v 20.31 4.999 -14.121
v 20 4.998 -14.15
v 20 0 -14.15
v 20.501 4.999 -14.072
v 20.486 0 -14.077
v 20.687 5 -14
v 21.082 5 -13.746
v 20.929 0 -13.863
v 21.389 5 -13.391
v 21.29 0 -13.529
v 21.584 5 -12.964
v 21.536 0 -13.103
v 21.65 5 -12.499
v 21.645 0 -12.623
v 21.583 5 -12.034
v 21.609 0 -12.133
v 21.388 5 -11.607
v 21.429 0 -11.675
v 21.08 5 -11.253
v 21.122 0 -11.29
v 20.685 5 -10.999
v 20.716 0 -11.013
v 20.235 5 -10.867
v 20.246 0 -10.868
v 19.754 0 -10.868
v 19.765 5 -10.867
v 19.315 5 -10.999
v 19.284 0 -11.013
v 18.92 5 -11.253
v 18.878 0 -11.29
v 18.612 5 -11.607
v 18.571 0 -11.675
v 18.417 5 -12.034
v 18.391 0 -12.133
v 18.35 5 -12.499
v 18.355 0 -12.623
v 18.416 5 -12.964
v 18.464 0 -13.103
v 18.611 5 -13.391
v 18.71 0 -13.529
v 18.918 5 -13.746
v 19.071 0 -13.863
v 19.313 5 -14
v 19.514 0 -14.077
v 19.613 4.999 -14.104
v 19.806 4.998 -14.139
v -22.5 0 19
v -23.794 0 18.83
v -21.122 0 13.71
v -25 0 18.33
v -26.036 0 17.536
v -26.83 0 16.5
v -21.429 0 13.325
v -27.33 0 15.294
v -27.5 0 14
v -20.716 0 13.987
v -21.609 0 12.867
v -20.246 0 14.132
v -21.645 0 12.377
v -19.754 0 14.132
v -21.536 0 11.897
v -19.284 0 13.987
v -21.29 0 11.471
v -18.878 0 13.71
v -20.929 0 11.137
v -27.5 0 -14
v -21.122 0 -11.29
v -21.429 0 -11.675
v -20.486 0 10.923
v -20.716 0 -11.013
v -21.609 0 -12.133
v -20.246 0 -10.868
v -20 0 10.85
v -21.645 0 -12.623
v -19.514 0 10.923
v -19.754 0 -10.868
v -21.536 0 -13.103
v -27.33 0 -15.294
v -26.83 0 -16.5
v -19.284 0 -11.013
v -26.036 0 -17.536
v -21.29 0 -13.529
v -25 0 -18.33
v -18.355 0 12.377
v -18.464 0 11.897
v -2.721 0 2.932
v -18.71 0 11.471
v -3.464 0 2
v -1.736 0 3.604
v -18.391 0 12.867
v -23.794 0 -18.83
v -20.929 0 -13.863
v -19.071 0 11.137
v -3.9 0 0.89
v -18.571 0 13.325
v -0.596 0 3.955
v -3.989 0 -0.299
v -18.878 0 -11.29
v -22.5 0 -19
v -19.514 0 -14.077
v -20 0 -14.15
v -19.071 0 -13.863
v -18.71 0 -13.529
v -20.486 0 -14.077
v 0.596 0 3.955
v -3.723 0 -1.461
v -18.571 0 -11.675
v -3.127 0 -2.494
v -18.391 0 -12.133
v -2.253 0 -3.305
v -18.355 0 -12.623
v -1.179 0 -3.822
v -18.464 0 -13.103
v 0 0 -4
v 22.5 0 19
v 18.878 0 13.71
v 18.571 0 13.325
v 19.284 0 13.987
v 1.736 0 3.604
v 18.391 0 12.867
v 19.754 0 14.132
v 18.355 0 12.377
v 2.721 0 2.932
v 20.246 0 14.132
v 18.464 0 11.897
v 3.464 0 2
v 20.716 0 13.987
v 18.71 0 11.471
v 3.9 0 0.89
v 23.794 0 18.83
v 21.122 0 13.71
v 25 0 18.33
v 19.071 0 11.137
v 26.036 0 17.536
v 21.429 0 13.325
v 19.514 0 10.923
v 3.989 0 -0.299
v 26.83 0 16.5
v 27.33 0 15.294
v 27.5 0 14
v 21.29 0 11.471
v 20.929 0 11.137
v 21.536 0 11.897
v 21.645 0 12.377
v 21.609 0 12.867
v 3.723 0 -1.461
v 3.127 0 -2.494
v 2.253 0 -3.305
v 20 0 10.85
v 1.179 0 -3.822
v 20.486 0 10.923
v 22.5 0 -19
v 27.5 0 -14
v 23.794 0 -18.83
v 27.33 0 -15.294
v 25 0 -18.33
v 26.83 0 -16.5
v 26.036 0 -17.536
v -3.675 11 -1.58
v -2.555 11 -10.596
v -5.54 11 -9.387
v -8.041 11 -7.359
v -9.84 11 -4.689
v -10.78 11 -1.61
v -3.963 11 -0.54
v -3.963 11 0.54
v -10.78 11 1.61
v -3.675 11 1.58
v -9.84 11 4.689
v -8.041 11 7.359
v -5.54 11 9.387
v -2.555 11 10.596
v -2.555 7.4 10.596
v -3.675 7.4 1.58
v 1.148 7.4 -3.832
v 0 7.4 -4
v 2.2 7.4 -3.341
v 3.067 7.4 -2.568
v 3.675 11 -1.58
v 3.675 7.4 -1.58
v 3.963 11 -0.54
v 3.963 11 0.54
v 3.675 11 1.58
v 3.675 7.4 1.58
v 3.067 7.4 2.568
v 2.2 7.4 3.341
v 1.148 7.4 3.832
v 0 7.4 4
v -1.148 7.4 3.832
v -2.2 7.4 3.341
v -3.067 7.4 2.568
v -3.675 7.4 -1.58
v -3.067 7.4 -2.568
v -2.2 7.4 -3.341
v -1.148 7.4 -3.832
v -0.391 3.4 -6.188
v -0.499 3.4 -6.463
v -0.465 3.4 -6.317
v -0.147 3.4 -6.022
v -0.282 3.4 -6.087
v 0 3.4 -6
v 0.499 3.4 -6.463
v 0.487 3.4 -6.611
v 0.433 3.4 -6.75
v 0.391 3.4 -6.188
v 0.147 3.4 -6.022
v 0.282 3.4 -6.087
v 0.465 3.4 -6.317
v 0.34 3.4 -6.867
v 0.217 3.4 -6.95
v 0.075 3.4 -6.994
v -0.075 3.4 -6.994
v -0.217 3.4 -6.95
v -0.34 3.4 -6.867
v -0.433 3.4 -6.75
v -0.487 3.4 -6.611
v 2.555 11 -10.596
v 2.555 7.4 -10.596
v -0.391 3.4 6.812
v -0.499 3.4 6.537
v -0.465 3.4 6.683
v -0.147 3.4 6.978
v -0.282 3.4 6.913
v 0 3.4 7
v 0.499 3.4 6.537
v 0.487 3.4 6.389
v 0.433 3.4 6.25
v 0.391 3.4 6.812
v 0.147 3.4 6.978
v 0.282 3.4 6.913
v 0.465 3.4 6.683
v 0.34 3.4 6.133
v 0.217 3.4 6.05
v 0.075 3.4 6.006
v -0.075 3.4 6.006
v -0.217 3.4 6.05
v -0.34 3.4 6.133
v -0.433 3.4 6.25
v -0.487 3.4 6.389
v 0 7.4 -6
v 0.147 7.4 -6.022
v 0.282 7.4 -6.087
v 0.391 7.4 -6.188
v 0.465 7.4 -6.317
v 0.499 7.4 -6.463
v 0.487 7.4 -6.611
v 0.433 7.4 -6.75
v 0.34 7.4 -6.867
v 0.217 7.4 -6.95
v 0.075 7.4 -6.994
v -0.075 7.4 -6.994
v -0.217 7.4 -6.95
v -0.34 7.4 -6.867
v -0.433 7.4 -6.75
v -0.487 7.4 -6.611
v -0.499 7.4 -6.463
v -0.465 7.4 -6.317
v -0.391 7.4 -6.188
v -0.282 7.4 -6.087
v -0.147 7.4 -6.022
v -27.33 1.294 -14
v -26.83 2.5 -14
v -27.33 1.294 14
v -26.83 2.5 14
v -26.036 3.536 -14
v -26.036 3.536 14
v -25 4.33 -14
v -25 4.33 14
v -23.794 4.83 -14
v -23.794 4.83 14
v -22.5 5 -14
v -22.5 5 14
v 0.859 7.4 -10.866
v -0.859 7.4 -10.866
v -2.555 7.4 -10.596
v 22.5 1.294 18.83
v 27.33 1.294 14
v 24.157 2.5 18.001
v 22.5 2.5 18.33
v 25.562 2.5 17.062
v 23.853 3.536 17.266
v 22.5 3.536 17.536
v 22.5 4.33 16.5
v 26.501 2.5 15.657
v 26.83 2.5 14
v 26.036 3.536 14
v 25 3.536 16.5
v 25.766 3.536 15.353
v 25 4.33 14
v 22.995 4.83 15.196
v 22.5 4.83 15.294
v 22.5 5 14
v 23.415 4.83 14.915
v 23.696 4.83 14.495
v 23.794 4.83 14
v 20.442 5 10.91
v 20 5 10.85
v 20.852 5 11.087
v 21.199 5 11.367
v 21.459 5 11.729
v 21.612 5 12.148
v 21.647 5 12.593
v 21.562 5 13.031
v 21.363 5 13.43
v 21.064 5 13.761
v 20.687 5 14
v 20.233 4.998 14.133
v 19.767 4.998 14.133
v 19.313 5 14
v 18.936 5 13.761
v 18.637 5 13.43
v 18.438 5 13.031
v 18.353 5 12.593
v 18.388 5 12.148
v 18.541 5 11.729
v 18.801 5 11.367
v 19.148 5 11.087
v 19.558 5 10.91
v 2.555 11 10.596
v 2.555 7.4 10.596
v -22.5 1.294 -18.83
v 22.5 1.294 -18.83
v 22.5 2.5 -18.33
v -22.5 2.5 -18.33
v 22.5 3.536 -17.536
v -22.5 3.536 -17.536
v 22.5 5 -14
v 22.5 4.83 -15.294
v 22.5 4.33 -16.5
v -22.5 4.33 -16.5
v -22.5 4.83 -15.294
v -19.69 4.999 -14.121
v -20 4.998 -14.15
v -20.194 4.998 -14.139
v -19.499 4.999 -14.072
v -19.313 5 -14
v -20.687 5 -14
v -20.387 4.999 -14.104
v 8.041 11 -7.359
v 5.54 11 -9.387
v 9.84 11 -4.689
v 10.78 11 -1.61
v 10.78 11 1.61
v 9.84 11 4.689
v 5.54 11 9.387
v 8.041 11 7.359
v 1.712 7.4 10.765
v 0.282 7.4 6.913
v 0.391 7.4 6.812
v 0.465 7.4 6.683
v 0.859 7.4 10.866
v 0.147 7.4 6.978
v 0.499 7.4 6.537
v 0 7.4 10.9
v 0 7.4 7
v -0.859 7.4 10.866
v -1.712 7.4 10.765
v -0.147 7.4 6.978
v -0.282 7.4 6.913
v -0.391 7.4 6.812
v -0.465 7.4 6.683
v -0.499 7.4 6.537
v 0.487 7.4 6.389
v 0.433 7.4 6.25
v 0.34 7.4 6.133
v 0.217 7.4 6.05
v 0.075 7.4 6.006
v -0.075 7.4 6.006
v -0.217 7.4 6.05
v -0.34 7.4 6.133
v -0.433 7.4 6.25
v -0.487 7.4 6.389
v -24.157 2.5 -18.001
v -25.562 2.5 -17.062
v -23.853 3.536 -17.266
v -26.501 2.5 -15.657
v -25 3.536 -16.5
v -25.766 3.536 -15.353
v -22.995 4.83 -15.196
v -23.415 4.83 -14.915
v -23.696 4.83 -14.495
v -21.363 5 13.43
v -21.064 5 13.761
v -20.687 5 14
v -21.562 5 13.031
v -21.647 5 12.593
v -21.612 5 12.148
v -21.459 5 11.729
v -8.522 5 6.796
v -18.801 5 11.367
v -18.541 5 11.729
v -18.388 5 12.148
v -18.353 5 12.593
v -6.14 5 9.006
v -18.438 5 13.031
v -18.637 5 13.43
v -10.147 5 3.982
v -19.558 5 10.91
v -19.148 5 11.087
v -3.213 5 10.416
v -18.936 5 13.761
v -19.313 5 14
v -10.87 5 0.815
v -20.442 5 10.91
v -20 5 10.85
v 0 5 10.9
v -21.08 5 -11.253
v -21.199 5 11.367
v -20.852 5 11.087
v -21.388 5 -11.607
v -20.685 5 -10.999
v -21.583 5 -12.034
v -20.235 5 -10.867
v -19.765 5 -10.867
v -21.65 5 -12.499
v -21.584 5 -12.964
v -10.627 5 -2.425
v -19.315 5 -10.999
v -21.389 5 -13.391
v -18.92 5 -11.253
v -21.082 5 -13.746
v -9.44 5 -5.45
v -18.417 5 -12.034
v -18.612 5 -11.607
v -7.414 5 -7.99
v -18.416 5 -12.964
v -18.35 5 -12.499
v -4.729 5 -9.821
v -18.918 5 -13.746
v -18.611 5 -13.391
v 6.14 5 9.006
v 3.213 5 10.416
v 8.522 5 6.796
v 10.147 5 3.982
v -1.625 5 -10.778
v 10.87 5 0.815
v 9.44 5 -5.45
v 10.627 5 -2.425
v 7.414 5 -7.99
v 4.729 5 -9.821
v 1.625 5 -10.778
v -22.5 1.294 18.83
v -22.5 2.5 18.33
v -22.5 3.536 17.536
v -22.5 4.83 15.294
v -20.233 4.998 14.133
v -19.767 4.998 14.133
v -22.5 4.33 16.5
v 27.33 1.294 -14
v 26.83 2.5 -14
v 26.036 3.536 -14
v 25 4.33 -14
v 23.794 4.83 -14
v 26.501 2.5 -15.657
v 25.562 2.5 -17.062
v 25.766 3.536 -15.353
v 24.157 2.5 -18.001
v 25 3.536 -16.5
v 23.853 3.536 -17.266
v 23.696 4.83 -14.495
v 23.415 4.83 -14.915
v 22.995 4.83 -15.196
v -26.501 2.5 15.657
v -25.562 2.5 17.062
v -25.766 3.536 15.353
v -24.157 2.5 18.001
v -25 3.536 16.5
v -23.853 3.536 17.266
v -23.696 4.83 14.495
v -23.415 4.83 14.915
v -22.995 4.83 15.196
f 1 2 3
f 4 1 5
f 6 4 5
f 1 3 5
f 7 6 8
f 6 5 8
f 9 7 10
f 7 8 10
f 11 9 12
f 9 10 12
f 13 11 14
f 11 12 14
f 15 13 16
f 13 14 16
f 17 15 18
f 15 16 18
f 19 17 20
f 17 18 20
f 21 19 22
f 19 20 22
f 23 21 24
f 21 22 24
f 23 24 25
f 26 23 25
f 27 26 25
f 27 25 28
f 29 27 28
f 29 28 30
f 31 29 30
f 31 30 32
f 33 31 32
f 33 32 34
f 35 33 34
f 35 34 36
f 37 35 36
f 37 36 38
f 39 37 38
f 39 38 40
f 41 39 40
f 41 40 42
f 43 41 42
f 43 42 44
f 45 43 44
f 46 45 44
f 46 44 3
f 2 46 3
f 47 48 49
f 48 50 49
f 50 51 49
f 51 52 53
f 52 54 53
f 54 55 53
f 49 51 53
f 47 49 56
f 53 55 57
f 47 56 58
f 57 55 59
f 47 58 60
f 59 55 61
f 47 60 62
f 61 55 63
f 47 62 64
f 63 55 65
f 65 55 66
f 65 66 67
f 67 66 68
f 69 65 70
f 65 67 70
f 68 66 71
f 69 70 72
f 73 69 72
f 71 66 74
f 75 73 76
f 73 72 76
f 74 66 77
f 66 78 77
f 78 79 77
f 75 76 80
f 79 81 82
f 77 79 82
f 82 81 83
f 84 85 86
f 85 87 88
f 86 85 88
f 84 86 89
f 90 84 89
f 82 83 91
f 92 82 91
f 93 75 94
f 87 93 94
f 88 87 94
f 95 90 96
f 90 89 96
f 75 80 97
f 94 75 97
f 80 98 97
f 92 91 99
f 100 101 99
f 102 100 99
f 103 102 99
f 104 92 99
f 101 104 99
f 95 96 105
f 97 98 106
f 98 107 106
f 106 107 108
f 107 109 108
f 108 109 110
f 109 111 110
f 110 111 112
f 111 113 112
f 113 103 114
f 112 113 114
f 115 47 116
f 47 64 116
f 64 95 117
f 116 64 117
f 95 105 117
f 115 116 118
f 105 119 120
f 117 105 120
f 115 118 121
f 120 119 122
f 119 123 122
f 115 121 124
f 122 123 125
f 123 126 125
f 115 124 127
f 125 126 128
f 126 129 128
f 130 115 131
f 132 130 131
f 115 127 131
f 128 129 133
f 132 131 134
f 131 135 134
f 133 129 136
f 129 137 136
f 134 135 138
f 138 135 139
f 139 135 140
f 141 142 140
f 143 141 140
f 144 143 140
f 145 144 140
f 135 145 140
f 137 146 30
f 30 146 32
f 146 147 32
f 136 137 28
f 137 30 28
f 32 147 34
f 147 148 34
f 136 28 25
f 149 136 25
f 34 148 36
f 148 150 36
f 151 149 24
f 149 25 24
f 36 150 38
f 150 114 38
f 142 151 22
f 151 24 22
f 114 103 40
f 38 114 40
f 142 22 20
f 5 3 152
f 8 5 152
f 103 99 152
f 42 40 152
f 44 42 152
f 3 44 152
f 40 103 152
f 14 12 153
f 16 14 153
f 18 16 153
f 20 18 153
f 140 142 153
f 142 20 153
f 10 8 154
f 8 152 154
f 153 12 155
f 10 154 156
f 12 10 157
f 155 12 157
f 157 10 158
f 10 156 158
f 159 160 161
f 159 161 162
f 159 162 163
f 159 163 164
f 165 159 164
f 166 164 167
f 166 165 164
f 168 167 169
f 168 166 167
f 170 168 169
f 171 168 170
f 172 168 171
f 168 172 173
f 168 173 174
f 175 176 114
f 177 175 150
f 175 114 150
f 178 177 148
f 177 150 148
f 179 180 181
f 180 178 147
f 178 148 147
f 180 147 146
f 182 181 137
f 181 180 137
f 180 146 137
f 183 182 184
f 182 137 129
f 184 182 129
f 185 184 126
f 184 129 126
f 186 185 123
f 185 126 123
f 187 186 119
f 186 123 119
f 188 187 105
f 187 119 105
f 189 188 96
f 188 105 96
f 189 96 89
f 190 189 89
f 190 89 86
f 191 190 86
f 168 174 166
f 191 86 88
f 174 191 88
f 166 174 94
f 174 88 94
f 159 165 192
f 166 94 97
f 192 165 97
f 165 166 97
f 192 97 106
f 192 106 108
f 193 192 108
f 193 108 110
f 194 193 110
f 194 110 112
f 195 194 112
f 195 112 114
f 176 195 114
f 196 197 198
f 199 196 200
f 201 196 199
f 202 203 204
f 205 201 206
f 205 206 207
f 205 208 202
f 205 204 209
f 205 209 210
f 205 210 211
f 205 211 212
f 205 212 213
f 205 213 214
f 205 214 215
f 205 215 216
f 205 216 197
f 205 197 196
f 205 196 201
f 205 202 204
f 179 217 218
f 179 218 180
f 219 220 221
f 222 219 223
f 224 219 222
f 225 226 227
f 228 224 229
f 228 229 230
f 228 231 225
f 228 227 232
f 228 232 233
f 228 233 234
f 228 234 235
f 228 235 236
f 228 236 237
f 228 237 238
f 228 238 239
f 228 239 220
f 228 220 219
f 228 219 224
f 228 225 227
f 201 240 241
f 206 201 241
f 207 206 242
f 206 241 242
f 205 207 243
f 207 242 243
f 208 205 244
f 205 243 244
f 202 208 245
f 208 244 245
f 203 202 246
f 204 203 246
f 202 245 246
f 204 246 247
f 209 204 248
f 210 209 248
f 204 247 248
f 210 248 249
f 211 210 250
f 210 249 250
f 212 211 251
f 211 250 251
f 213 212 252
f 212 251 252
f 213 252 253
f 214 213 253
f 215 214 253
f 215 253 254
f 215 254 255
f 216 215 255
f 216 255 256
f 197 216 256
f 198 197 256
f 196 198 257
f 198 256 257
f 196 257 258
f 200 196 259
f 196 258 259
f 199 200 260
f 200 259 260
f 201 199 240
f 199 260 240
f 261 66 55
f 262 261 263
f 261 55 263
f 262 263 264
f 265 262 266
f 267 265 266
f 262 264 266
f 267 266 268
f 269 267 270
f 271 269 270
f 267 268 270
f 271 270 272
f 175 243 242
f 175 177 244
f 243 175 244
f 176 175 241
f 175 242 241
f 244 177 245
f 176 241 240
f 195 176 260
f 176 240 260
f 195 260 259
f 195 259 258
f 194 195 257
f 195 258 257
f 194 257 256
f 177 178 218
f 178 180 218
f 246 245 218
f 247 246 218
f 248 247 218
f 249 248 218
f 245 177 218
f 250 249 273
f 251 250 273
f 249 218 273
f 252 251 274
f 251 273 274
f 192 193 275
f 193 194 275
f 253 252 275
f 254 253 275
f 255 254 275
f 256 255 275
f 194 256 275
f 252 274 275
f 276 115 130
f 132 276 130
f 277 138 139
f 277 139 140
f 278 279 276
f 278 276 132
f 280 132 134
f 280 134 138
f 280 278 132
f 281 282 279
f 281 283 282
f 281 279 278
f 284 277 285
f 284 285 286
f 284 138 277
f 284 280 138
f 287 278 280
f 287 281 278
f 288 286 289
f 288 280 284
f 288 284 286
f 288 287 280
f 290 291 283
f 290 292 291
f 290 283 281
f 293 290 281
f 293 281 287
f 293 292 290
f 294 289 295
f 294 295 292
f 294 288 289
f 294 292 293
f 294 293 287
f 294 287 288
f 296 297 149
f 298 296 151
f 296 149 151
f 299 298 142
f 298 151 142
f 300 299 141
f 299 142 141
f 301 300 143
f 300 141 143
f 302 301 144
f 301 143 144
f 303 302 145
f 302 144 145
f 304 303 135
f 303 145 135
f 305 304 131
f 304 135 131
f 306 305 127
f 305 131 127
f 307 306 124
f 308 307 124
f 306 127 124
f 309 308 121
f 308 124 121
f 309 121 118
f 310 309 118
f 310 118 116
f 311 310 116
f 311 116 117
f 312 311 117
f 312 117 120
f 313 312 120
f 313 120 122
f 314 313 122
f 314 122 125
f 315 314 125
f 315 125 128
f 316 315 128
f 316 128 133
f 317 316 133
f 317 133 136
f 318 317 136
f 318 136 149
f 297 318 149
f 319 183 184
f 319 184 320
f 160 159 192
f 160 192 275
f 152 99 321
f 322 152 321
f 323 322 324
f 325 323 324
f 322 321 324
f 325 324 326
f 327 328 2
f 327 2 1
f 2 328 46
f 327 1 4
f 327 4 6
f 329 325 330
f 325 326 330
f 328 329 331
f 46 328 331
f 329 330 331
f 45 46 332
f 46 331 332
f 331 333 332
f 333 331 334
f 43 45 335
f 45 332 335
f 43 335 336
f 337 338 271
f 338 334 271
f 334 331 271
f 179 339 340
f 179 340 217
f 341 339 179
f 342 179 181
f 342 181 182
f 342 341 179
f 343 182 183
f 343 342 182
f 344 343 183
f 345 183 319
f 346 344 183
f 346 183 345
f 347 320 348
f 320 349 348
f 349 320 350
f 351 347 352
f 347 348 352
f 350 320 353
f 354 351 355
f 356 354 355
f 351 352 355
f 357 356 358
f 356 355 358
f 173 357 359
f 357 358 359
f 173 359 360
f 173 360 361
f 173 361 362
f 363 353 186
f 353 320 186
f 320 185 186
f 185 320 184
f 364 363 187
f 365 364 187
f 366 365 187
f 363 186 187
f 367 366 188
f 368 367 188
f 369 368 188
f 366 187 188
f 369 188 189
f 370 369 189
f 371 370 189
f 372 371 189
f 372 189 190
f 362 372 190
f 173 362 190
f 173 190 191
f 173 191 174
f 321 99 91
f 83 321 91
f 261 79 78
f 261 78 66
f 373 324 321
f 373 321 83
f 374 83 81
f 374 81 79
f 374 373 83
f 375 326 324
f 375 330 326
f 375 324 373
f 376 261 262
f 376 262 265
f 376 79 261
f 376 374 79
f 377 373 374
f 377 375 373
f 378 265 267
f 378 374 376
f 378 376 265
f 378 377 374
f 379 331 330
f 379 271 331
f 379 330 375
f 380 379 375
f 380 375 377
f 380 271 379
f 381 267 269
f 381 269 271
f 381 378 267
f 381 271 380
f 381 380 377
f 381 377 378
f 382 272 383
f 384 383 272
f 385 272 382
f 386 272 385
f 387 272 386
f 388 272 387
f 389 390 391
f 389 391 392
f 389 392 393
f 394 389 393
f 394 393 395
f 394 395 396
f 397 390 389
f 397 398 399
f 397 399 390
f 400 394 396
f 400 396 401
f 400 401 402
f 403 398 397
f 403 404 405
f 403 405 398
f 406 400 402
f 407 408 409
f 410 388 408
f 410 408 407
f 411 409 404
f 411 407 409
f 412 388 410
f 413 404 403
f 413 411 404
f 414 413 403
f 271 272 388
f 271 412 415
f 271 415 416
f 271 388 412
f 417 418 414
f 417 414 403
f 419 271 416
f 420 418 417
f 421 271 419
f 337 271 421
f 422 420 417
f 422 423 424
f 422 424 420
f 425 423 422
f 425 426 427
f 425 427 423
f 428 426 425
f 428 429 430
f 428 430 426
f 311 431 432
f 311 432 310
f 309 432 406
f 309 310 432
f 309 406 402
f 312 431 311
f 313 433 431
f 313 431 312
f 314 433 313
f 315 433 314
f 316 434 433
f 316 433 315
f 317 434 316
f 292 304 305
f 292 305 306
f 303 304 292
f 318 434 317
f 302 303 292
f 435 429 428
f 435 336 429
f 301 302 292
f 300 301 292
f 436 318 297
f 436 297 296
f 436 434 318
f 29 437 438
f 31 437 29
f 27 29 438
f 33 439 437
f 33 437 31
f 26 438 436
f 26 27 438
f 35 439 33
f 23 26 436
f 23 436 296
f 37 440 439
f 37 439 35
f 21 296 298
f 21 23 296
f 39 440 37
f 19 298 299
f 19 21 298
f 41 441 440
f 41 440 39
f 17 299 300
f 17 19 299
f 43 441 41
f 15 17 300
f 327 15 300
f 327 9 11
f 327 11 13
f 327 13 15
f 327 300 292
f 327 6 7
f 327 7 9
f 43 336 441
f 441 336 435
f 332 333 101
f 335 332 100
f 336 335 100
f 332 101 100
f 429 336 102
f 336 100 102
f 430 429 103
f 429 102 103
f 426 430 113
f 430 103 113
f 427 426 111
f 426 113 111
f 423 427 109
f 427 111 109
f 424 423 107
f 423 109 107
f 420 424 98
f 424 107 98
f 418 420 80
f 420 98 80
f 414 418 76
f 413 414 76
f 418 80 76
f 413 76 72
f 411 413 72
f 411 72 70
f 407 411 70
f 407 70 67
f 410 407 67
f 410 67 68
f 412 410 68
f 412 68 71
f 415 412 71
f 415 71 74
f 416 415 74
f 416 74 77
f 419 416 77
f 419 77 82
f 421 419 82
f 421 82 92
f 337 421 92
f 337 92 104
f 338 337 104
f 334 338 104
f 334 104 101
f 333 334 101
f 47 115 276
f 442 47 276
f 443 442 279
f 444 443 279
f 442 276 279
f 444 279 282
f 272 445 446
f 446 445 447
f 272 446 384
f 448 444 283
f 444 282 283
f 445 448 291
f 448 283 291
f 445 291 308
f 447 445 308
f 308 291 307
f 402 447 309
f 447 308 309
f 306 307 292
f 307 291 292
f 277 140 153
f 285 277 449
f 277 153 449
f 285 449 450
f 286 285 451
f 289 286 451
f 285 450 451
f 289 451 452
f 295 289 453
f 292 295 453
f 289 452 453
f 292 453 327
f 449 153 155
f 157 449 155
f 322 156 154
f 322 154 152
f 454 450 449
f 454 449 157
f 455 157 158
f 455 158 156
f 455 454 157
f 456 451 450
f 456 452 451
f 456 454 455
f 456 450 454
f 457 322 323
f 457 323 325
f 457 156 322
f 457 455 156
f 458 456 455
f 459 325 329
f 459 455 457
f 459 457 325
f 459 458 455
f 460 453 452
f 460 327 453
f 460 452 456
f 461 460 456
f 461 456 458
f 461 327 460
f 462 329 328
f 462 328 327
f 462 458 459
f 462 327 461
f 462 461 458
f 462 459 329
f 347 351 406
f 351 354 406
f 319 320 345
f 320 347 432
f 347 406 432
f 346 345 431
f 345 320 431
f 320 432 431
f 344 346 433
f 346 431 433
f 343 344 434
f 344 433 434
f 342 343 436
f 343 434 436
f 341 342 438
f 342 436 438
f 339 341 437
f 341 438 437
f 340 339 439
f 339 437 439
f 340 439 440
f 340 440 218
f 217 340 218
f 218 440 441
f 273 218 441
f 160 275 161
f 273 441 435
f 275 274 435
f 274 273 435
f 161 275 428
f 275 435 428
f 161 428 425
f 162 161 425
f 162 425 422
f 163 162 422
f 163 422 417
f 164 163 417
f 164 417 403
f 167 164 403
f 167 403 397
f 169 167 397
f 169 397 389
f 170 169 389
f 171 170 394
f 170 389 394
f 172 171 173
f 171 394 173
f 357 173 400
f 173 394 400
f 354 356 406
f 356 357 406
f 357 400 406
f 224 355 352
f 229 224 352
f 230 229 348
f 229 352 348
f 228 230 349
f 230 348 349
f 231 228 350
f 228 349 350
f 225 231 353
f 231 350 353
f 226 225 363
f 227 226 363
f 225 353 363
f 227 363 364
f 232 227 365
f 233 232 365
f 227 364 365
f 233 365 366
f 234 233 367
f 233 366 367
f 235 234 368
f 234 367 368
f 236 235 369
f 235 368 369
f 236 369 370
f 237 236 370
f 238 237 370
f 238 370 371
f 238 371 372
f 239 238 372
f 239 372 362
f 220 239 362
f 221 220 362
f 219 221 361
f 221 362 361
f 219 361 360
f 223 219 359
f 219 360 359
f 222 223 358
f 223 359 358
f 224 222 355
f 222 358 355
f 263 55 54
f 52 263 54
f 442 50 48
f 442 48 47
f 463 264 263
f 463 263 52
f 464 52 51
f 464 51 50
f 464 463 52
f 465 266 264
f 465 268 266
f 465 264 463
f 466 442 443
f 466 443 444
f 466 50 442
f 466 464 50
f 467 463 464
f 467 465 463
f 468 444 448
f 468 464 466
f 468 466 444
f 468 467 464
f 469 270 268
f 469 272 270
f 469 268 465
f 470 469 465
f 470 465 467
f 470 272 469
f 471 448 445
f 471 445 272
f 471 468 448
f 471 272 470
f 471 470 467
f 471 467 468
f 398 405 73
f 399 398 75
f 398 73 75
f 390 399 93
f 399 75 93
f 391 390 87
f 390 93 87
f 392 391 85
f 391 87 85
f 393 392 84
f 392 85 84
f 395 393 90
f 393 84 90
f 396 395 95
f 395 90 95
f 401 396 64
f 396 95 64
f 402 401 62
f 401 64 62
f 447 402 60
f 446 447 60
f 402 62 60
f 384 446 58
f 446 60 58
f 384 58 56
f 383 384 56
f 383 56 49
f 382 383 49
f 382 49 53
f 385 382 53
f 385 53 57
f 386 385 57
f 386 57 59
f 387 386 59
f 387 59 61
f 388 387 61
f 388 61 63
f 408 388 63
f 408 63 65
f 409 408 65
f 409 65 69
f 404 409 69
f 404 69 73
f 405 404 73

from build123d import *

# Parameters (mm, degrees)
SKETCH_1_W          = 55
SKETCH_1_H          = 38
EXTRUDE_1_DEPTH     = 5
SKETCH_2_R          = 10.9
EXTRUDE_2_DEPTH     = 6
SKETCH_3_R          = 4
CUT_EXTRUDE_1_DEPTH = 36.18877662
CUT_EXTRUDE_2_DEPTH = 3.6
SKETCH_5_R          = 0.5
CUT_EXTRUDE_3_DEPTH = 4
FILLET_1_R          = 5
FILLET_2_R          = 5
FILLET_3_R          = 5
FILLET_4_R          = 5
FILLET_5_R          = 5
SKETCH_6_R          = 1.65
CUT_EXTRUDE_4_DEPTH = 36.18877662


with BuildPart() as part:
    # 草图1 → 凸台-拉伸1 (new body)
    with BuildSketch(Plane(origin=(0, 0, 0), x_dir=(1, 0, 0), z_dir=(0, 1, 0))):
        Rectangle(SKETCH_1_W, SKETCH_1_H)
    extrude(amount=EXTRUDE_1_DEPTH)

    # 草图2 → 凸台-拉伸2 (add)
    with BuildSketch(Plane(origin=(0, 5, 0), x_dir=(1, 0, 0), z_dir=(0, 1, 0))):
        with Locations(Location((0, 0, 0), (0, 0, 270))):
            Circle(SKETCH_2_R)
    extrude(amount=EXTRUDE_2_DEPTH)

    # 草图3 → 切除-拉伸1 (cut, through all)
    with BuildSketch(Plane.XZ):
        with Locations(Location((0, 0, 0), (0, 0, 270))):
            Circle(SKETCH_3_R)
    extrude(amount=-CUT_EXTRUDE_1_DEPTH, mode=Mode.SUBTRACT)

    # 草图4 → 切除-拉伸2 (cut)
    with BuildSketch(Plane(origin=(0, 11, 0), x_dir=(1, 0, 0), z_dir=(0, 1, 0))):
        Polygon((3.674809939, -1.579801226), (2.341337155, -12.320336373), (-2.341337155, -12.320336373), (-3.674809939, -1.579801226), align=None)
        Polygon((-3.674809939, 1.579801226), (-2.341337155, 12.320336373), (2.341337155, 12.320336373), (3.674809939, 1.579801226), align=None)
    extrude(amount=-CUT_EXTRUDE_2_DEPTH, mode=Mode.SUBTRACT)

    # 草图5 → 切除-拉伸3 (cut)
    with BuildSketch(Plane(origin=(0, 7.4, 0), x_dir=(1, 0, 0), z_dir=(0, 1, 0))):
        with Locations(Location((0, -6.5, 0), (0, 0, 270))):
            Circle(SKETCH_5_R)
        with Locations(Location((0, 6.5, 0), (0, 0, 270))):
            Circle(SKETCH_5_R)
    extrude(amount=-CUT_EXTRUDE_3_DEPTH, mode=Mode.SUBTRACT)

    # 圆角1
    fillet_1_edges = [part.edges().sort_by_distance(p)[0] for p in [
        (27.5, 2.5, 19),
    ]]
    fillet(fillet_1_edges, radius=FILLET_1_R)

    # 圆角2
    fillet_2_edges = [part.edges().sort_by_distance(p)[0] for p in [
        (-27.5, 2.5, 19),
    ]]
    fillet(fillet_2_edges, radius=FILLET_2_R)

    # 圆角3
    fillet_3_edges = [part.edges().sort_by_distance(p)[0] for p in [
        (-27.5, 2.5, -19),
    ]]
    fillet(fillet_3_edges, radius=FILLET_3_R)

    # 圆角4
    fillet_4_edges = [part.edges().sort_by_distance(p)[0] for p in [
        (27.5, 2.5, -19),
    ]]
    fillet(fillet_4_edges, radius=FILLET_4_R)

    # 圆角5
    fillet_5_edges = [part.edges().sort_by_distance(p)[0] for p in [
        (27.5, 5, 0),
        (0, 5, 19),
        (-27.5, 5, 0),
        (0, 5, -19),
        (26.035533906, 5, 17.535533906),
        (-26.035533906, 5, 17.535533906),
        (-26.035533906, 5, -17.535533906),
        (26.035533906, 5, -17.535533906),
    ]]
    fillet(fillet_5_edges, radius=FILLET_5_R - 0.0001)  # a hair under: the kernel refuses the full size

    # 草图6 → 切除-拉伸4 (cut, through all)
    with BuildSketch(Plane.XZ):
        with Locations(Location((-20, 12.5, 0), (0, 0, 270))):
            Circle(SKETCH_6_R)
        with Locations(Location((20, 12.5, 0), (0, 0, 270))):
            Circle(SKETCH_6_R)
        with Locations(Location((20, -12.5, 0), (0, 0, 270))):
            Circle(SKETCH_6_R)
        with Locations(Location((-20, -12.5, 0), (0, 0, 270))):
            Circle(SKETCH_6_R)
    extrude(amount=-CUT_EXTRUDE_4_DEPTH, mode=Mode.SUBTRACT)


solid = part.part
